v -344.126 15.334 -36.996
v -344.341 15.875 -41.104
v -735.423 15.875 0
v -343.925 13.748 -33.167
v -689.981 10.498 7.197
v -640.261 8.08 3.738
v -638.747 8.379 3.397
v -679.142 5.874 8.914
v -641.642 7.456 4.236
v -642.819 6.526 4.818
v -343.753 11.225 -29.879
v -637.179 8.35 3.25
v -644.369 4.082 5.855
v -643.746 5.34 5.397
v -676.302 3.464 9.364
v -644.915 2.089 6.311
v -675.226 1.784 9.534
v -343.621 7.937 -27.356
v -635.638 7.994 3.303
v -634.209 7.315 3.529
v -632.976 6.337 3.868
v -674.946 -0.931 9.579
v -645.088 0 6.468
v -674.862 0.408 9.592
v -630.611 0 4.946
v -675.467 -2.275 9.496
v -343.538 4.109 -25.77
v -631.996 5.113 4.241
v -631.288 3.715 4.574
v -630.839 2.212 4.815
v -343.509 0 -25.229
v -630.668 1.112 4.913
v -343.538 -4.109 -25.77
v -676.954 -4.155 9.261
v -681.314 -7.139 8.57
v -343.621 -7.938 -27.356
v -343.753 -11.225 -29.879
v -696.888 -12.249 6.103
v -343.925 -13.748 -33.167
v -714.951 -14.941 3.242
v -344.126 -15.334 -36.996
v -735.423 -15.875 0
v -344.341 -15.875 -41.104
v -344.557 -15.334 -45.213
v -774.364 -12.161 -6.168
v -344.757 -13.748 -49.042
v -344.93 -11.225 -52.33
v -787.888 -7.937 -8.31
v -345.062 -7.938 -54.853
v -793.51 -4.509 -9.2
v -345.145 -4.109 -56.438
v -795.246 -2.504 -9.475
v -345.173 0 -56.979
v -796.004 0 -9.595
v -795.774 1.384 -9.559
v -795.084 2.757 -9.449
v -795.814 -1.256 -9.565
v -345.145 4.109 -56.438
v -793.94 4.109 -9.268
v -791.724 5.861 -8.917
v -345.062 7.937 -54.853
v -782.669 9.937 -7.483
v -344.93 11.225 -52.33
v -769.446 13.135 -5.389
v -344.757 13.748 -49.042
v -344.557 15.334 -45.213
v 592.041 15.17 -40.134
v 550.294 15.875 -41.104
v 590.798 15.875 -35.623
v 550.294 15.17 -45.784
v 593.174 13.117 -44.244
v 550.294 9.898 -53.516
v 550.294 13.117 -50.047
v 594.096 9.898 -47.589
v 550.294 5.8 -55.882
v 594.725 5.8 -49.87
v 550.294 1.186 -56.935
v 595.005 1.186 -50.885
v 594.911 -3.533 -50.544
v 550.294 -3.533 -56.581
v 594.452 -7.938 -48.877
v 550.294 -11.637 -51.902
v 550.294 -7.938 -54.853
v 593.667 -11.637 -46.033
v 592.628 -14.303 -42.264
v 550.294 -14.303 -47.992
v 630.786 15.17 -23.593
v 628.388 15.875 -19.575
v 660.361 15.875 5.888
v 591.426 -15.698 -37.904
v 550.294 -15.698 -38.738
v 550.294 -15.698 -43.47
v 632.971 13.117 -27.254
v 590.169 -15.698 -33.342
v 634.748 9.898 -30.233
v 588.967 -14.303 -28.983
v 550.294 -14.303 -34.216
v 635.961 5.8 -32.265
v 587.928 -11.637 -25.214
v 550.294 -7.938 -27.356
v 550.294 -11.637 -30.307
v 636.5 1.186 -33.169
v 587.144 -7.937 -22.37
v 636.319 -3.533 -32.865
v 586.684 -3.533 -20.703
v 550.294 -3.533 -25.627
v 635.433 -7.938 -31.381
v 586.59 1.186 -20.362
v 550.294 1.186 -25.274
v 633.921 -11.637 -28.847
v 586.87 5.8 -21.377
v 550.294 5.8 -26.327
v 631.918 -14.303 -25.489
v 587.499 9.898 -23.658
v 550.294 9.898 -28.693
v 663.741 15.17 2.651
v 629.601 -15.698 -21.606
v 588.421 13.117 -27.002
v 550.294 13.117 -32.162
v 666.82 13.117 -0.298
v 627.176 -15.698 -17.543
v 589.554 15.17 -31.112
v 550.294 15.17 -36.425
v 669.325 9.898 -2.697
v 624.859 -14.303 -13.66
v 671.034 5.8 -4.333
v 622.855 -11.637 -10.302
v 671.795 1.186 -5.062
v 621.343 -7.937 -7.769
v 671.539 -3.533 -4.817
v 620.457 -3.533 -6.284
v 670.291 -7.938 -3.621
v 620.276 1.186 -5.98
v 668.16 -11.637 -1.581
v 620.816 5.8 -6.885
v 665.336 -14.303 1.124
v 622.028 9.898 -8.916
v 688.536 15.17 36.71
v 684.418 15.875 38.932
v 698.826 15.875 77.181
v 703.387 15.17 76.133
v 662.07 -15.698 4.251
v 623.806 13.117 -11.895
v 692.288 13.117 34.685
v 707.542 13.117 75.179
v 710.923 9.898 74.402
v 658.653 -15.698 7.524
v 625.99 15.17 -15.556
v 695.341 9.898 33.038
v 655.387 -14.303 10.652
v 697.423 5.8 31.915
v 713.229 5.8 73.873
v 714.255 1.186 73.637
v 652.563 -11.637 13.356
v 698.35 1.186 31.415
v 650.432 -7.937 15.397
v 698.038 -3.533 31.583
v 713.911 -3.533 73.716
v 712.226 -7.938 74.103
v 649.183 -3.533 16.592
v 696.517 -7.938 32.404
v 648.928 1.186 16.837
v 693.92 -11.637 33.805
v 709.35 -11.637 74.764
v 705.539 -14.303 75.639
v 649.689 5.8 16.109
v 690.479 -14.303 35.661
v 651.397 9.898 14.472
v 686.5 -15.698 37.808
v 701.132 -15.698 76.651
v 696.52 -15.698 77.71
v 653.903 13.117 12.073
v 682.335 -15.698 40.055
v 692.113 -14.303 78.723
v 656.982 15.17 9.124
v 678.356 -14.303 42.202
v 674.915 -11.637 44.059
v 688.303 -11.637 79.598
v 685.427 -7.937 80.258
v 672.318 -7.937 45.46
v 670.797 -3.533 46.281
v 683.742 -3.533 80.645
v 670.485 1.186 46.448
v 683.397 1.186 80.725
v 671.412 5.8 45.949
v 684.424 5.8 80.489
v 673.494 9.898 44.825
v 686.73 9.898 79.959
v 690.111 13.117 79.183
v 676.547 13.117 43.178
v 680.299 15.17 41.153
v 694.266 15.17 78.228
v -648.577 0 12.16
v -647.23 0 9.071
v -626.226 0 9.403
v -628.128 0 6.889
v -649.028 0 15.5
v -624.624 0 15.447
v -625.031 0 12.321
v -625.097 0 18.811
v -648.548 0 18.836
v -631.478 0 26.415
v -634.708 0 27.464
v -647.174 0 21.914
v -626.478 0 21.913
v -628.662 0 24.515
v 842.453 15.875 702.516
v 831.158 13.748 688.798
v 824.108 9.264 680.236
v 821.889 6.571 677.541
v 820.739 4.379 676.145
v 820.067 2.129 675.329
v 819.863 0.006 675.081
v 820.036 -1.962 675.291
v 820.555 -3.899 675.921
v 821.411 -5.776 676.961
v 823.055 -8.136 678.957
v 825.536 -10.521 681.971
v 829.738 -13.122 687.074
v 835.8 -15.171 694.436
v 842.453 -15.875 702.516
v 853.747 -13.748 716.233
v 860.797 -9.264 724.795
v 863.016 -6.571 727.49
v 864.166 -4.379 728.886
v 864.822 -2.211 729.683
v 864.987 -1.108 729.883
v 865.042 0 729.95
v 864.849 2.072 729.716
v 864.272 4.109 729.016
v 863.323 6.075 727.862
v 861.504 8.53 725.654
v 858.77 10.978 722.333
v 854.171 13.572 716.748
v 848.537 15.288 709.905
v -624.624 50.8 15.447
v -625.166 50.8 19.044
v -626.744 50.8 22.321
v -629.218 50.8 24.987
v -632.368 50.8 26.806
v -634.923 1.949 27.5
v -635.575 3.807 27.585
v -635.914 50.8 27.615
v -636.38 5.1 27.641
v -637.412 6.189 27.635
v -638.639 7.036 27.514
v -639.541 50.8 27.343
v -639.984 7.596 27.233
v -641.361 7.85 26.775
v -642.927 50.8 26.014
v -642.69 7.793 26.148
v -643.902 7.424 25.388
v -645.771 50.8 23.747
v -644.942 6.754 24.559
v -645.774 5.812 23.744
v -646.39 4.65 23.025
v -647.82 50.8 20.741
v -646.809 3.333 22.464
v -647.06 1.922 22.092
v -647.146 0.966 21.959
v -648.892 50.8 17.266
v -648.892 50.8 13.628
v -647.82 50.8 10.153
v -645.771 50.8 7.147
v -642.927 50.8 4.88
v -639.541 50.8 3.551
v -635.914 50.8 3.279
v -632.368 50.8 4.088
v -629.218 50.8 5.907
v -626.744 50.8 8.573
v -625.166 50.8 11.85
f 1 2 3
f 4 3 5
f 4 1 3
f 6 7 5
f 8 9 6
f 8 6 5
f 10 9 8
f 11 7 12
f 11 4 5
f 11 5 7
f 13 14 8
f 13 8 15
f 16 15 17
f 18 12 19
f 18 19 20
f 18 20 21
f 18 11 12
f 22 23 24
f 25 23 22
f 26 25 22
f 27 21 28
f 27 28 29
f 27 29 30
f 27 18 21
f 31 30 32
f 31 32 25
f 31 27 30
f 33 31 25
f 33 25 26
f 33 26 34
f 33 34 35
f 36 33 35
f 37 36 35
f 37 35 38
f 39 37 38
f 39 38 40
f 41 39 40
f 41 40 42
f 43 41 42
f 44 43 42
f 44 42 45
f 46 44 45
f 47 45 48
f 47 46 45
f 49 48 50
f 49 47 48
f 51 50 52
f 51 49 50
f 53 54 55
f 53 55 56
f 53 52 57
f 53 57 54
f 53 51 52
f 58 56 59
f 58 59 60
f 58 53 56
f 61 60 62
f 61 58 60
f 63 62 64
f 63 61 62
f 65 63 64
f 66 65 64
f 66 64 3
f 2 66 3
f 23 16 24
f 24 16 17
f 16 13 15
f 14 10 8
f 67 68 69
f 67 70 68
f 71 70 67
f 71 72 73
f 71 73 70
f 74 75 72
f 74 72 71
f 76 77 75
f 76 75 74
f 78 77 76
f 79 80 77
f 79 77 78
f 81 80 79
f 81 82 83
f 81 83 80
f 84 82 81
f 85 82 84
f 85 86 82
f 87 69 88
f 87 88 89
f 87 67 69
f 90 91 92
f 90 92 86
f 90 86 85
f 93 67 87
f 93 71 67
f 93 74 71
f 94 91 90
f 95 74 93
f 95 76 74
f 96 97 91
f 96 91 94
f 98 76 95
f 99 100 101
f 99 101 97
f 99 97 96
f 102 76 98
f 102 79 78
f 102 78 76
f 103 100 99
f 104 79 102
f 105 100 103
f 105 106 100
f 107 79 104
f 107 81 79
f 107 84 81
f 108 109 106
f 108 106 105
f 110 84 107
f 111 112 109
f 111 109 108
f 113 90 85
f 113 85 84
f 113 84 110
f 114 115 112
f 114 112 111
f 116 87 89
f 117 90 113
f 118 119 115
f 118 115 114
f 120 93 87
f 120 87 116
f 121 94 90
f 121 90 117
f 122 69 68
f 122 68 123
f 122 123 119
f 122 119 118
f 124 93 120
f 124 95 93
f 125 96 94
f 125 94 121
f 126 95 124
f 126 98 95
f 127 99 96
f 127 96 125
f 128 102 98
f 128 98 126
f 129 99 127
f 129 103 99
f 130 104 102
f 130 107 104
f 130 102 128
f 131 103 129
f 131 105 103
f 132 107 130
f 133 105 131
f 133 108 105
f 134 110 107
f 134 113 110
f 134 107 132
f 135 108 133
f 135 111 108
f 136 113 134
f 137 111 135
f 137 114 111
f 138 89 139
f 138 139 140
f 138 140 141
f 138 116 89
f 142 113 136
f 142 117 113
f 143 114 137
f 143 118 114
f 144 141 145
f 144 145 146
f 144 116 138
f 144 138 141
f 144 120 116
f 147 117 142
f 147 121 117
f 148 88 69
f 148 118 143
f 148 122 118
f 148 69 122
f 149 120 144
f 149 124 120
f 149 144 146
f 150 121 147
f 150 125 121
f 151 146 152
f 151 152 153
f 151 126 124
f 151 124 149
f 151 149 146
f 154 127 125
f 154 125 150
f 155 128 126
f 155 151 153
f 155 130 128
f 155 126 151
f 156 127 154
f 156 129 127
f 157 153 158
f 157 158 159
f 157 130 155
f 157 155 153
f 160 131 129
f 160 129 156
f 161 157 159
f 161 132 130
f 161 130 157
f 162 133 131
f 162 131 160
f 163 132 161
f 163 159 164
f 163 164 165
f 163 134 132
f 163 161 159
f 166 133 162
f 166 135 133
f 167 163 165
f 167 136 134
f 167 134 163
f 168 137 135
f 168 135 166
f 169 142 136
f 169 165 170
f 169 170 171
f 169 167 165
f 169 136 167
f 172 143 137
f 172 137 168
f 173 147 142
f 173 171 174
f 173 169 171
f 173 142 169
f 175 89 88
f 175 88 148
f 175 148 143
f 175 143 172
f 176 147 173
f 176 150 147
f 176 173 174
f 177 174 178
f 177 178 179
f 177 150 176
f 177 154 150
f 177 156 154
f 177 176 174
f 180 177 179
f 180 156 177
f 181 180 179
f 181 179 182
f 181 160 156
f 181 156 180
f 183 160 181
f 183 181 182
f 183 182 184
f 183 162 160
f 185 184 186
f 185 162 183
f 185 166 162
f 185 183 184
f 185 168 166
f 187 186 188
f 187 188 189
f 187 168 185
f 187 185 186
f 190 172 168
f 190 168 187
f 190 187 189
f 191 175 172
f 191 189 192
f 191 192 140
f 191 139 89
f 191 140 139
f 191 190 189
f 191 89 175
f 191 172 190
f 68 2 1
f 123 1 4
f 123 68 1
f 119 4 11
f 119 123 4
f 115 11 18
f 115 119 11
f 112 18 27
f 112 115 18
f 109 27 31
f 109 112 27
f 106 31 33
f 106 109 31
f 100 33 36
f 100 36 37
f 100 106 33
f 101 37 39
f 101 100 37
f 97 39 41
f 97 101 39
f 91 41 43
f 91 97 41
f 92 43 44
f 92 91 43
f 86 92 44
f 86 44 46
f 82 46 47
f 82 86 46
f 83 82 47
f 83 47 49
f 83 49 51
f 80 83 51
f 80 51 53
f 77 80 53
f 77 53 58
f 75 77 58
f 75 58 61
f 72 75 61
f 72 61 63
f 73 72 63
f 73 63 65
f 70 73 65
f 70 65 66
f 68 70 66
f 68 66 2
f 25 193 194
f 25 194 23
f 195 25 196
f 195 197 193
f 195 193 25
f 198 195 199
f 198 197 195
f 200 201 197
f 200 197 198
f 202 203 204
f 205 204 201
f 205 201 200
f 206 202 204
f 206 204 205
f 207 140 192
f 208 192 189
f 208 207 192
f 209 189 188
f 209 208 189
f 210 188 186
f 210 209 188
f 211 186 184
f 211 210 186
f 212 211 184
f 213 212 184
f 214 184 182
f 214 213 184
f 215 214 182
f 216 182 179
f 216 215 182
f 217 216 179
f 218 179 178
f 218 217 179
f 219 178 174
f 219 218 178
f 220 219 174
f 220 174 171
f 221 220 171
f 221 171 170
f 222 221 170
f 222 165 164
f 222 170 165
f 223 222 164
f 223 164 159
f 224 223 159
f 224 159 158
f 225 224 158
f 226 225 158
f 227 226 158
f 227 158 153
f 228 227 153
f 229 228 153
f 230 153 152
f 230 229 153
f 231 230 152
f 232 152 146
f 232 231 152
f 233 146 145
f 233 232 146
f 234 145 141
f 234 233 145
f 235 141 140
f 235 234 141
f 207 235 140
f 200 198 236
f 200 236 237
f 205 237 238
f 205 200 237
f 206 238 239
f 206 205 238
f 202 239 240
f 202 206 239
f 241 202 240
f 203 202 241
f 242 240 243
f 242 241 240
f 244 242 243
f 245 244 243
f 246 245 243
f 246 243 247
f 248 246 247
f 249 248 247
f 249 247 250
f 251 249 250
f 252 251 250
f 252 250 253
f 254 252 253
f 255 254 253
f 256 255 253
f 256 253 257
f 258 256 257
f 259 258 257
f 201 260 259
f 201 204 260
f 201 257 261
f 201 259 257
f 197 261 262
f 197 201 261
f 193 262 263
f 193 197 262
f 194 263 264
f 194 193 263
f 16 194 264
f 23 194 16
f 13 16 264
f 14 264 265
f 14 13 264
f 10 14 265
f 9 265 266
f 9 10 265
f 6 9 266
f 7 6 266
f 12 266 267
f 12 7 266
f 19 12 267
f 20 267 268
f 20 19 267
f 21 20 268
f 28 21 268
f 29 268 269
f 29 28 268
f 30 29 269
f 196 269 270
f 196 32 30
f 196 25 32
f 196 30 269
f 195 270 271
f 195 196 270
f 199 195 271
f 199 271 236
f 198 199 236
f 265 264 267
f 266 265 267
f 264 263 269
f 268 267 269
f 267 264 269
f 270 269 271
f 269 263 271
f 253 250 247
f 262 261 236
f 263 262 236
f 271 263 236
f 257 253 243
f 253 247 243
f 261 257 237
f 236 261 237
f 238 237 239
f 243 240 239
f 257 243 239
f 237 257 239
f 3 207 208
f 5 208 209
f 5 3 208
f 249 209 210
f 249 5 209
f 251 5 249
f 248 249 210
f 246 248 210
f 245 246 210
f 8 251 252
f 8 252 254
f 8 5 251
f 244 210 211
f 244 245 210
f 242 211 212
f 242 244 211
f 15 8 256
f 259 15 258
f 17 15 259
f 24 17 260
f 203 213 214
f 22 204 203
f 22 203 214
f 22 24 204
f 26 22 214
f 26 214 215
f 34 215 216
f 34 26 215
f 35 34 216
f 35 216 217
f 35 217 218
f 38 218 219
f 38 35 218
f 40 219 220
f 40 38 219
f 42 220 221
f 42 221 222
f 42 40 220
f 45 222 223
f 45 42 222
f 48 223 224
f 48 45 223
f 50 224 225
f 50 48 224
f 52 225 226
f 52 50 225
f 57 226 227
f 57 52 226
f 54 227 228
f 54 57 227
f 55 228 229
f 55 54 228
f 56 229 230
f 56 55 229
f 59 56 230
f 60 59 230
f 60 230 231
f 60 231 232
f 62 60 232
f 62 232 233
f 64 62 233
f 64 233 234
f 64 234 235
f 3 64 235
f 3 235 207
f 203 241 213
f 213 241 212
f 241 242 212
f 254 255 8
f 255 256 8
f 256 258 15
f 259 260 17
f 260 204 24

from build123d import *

# Parameters (mm, degrees)
F1_R     = 15.875
F3_R     = 12.2021545383
F4_DEPTH = 50.8


with BuildPart() as f2:
    # F2: sweep along a path in F0
    with BuildLine(Plane.XZ) as f2_path:
        Line((-344.3413384318, -41.1043575529), (550.2936645415, -41.1043575529))
        ThreePointArc((550.2936645415, -41.1043575529), (645.2322257553, -7.9202524438), (698.826283108, 77.1808183703))
        Line((698.826283108, 77.1808183703), (842.452537594, 702.5155299205))
        Line((842.452537594, 702.5155299205), (-735.4231768463, 0))
        Line((-735.4231768463, 0), (-344.3413384318, -41.1043575529))
    # F1 (on Right) → F2 (sweep)
    with BuildSketch(Plane.YZ):
        with Locations((0, -41.1043575529)):
            Circle(F1_R)
    sweep(path=f2_path.line, transition=Transition.RIGHT)

    # F3 (on Front) → F4 (join)
    with BuildSketch(Plane.XZ):
        with Locations((-636.8260383606, 15.446998179)):
            Circle(F3_R)
    extrude(amount=-F4_DEPTH)


solid = f2.part
